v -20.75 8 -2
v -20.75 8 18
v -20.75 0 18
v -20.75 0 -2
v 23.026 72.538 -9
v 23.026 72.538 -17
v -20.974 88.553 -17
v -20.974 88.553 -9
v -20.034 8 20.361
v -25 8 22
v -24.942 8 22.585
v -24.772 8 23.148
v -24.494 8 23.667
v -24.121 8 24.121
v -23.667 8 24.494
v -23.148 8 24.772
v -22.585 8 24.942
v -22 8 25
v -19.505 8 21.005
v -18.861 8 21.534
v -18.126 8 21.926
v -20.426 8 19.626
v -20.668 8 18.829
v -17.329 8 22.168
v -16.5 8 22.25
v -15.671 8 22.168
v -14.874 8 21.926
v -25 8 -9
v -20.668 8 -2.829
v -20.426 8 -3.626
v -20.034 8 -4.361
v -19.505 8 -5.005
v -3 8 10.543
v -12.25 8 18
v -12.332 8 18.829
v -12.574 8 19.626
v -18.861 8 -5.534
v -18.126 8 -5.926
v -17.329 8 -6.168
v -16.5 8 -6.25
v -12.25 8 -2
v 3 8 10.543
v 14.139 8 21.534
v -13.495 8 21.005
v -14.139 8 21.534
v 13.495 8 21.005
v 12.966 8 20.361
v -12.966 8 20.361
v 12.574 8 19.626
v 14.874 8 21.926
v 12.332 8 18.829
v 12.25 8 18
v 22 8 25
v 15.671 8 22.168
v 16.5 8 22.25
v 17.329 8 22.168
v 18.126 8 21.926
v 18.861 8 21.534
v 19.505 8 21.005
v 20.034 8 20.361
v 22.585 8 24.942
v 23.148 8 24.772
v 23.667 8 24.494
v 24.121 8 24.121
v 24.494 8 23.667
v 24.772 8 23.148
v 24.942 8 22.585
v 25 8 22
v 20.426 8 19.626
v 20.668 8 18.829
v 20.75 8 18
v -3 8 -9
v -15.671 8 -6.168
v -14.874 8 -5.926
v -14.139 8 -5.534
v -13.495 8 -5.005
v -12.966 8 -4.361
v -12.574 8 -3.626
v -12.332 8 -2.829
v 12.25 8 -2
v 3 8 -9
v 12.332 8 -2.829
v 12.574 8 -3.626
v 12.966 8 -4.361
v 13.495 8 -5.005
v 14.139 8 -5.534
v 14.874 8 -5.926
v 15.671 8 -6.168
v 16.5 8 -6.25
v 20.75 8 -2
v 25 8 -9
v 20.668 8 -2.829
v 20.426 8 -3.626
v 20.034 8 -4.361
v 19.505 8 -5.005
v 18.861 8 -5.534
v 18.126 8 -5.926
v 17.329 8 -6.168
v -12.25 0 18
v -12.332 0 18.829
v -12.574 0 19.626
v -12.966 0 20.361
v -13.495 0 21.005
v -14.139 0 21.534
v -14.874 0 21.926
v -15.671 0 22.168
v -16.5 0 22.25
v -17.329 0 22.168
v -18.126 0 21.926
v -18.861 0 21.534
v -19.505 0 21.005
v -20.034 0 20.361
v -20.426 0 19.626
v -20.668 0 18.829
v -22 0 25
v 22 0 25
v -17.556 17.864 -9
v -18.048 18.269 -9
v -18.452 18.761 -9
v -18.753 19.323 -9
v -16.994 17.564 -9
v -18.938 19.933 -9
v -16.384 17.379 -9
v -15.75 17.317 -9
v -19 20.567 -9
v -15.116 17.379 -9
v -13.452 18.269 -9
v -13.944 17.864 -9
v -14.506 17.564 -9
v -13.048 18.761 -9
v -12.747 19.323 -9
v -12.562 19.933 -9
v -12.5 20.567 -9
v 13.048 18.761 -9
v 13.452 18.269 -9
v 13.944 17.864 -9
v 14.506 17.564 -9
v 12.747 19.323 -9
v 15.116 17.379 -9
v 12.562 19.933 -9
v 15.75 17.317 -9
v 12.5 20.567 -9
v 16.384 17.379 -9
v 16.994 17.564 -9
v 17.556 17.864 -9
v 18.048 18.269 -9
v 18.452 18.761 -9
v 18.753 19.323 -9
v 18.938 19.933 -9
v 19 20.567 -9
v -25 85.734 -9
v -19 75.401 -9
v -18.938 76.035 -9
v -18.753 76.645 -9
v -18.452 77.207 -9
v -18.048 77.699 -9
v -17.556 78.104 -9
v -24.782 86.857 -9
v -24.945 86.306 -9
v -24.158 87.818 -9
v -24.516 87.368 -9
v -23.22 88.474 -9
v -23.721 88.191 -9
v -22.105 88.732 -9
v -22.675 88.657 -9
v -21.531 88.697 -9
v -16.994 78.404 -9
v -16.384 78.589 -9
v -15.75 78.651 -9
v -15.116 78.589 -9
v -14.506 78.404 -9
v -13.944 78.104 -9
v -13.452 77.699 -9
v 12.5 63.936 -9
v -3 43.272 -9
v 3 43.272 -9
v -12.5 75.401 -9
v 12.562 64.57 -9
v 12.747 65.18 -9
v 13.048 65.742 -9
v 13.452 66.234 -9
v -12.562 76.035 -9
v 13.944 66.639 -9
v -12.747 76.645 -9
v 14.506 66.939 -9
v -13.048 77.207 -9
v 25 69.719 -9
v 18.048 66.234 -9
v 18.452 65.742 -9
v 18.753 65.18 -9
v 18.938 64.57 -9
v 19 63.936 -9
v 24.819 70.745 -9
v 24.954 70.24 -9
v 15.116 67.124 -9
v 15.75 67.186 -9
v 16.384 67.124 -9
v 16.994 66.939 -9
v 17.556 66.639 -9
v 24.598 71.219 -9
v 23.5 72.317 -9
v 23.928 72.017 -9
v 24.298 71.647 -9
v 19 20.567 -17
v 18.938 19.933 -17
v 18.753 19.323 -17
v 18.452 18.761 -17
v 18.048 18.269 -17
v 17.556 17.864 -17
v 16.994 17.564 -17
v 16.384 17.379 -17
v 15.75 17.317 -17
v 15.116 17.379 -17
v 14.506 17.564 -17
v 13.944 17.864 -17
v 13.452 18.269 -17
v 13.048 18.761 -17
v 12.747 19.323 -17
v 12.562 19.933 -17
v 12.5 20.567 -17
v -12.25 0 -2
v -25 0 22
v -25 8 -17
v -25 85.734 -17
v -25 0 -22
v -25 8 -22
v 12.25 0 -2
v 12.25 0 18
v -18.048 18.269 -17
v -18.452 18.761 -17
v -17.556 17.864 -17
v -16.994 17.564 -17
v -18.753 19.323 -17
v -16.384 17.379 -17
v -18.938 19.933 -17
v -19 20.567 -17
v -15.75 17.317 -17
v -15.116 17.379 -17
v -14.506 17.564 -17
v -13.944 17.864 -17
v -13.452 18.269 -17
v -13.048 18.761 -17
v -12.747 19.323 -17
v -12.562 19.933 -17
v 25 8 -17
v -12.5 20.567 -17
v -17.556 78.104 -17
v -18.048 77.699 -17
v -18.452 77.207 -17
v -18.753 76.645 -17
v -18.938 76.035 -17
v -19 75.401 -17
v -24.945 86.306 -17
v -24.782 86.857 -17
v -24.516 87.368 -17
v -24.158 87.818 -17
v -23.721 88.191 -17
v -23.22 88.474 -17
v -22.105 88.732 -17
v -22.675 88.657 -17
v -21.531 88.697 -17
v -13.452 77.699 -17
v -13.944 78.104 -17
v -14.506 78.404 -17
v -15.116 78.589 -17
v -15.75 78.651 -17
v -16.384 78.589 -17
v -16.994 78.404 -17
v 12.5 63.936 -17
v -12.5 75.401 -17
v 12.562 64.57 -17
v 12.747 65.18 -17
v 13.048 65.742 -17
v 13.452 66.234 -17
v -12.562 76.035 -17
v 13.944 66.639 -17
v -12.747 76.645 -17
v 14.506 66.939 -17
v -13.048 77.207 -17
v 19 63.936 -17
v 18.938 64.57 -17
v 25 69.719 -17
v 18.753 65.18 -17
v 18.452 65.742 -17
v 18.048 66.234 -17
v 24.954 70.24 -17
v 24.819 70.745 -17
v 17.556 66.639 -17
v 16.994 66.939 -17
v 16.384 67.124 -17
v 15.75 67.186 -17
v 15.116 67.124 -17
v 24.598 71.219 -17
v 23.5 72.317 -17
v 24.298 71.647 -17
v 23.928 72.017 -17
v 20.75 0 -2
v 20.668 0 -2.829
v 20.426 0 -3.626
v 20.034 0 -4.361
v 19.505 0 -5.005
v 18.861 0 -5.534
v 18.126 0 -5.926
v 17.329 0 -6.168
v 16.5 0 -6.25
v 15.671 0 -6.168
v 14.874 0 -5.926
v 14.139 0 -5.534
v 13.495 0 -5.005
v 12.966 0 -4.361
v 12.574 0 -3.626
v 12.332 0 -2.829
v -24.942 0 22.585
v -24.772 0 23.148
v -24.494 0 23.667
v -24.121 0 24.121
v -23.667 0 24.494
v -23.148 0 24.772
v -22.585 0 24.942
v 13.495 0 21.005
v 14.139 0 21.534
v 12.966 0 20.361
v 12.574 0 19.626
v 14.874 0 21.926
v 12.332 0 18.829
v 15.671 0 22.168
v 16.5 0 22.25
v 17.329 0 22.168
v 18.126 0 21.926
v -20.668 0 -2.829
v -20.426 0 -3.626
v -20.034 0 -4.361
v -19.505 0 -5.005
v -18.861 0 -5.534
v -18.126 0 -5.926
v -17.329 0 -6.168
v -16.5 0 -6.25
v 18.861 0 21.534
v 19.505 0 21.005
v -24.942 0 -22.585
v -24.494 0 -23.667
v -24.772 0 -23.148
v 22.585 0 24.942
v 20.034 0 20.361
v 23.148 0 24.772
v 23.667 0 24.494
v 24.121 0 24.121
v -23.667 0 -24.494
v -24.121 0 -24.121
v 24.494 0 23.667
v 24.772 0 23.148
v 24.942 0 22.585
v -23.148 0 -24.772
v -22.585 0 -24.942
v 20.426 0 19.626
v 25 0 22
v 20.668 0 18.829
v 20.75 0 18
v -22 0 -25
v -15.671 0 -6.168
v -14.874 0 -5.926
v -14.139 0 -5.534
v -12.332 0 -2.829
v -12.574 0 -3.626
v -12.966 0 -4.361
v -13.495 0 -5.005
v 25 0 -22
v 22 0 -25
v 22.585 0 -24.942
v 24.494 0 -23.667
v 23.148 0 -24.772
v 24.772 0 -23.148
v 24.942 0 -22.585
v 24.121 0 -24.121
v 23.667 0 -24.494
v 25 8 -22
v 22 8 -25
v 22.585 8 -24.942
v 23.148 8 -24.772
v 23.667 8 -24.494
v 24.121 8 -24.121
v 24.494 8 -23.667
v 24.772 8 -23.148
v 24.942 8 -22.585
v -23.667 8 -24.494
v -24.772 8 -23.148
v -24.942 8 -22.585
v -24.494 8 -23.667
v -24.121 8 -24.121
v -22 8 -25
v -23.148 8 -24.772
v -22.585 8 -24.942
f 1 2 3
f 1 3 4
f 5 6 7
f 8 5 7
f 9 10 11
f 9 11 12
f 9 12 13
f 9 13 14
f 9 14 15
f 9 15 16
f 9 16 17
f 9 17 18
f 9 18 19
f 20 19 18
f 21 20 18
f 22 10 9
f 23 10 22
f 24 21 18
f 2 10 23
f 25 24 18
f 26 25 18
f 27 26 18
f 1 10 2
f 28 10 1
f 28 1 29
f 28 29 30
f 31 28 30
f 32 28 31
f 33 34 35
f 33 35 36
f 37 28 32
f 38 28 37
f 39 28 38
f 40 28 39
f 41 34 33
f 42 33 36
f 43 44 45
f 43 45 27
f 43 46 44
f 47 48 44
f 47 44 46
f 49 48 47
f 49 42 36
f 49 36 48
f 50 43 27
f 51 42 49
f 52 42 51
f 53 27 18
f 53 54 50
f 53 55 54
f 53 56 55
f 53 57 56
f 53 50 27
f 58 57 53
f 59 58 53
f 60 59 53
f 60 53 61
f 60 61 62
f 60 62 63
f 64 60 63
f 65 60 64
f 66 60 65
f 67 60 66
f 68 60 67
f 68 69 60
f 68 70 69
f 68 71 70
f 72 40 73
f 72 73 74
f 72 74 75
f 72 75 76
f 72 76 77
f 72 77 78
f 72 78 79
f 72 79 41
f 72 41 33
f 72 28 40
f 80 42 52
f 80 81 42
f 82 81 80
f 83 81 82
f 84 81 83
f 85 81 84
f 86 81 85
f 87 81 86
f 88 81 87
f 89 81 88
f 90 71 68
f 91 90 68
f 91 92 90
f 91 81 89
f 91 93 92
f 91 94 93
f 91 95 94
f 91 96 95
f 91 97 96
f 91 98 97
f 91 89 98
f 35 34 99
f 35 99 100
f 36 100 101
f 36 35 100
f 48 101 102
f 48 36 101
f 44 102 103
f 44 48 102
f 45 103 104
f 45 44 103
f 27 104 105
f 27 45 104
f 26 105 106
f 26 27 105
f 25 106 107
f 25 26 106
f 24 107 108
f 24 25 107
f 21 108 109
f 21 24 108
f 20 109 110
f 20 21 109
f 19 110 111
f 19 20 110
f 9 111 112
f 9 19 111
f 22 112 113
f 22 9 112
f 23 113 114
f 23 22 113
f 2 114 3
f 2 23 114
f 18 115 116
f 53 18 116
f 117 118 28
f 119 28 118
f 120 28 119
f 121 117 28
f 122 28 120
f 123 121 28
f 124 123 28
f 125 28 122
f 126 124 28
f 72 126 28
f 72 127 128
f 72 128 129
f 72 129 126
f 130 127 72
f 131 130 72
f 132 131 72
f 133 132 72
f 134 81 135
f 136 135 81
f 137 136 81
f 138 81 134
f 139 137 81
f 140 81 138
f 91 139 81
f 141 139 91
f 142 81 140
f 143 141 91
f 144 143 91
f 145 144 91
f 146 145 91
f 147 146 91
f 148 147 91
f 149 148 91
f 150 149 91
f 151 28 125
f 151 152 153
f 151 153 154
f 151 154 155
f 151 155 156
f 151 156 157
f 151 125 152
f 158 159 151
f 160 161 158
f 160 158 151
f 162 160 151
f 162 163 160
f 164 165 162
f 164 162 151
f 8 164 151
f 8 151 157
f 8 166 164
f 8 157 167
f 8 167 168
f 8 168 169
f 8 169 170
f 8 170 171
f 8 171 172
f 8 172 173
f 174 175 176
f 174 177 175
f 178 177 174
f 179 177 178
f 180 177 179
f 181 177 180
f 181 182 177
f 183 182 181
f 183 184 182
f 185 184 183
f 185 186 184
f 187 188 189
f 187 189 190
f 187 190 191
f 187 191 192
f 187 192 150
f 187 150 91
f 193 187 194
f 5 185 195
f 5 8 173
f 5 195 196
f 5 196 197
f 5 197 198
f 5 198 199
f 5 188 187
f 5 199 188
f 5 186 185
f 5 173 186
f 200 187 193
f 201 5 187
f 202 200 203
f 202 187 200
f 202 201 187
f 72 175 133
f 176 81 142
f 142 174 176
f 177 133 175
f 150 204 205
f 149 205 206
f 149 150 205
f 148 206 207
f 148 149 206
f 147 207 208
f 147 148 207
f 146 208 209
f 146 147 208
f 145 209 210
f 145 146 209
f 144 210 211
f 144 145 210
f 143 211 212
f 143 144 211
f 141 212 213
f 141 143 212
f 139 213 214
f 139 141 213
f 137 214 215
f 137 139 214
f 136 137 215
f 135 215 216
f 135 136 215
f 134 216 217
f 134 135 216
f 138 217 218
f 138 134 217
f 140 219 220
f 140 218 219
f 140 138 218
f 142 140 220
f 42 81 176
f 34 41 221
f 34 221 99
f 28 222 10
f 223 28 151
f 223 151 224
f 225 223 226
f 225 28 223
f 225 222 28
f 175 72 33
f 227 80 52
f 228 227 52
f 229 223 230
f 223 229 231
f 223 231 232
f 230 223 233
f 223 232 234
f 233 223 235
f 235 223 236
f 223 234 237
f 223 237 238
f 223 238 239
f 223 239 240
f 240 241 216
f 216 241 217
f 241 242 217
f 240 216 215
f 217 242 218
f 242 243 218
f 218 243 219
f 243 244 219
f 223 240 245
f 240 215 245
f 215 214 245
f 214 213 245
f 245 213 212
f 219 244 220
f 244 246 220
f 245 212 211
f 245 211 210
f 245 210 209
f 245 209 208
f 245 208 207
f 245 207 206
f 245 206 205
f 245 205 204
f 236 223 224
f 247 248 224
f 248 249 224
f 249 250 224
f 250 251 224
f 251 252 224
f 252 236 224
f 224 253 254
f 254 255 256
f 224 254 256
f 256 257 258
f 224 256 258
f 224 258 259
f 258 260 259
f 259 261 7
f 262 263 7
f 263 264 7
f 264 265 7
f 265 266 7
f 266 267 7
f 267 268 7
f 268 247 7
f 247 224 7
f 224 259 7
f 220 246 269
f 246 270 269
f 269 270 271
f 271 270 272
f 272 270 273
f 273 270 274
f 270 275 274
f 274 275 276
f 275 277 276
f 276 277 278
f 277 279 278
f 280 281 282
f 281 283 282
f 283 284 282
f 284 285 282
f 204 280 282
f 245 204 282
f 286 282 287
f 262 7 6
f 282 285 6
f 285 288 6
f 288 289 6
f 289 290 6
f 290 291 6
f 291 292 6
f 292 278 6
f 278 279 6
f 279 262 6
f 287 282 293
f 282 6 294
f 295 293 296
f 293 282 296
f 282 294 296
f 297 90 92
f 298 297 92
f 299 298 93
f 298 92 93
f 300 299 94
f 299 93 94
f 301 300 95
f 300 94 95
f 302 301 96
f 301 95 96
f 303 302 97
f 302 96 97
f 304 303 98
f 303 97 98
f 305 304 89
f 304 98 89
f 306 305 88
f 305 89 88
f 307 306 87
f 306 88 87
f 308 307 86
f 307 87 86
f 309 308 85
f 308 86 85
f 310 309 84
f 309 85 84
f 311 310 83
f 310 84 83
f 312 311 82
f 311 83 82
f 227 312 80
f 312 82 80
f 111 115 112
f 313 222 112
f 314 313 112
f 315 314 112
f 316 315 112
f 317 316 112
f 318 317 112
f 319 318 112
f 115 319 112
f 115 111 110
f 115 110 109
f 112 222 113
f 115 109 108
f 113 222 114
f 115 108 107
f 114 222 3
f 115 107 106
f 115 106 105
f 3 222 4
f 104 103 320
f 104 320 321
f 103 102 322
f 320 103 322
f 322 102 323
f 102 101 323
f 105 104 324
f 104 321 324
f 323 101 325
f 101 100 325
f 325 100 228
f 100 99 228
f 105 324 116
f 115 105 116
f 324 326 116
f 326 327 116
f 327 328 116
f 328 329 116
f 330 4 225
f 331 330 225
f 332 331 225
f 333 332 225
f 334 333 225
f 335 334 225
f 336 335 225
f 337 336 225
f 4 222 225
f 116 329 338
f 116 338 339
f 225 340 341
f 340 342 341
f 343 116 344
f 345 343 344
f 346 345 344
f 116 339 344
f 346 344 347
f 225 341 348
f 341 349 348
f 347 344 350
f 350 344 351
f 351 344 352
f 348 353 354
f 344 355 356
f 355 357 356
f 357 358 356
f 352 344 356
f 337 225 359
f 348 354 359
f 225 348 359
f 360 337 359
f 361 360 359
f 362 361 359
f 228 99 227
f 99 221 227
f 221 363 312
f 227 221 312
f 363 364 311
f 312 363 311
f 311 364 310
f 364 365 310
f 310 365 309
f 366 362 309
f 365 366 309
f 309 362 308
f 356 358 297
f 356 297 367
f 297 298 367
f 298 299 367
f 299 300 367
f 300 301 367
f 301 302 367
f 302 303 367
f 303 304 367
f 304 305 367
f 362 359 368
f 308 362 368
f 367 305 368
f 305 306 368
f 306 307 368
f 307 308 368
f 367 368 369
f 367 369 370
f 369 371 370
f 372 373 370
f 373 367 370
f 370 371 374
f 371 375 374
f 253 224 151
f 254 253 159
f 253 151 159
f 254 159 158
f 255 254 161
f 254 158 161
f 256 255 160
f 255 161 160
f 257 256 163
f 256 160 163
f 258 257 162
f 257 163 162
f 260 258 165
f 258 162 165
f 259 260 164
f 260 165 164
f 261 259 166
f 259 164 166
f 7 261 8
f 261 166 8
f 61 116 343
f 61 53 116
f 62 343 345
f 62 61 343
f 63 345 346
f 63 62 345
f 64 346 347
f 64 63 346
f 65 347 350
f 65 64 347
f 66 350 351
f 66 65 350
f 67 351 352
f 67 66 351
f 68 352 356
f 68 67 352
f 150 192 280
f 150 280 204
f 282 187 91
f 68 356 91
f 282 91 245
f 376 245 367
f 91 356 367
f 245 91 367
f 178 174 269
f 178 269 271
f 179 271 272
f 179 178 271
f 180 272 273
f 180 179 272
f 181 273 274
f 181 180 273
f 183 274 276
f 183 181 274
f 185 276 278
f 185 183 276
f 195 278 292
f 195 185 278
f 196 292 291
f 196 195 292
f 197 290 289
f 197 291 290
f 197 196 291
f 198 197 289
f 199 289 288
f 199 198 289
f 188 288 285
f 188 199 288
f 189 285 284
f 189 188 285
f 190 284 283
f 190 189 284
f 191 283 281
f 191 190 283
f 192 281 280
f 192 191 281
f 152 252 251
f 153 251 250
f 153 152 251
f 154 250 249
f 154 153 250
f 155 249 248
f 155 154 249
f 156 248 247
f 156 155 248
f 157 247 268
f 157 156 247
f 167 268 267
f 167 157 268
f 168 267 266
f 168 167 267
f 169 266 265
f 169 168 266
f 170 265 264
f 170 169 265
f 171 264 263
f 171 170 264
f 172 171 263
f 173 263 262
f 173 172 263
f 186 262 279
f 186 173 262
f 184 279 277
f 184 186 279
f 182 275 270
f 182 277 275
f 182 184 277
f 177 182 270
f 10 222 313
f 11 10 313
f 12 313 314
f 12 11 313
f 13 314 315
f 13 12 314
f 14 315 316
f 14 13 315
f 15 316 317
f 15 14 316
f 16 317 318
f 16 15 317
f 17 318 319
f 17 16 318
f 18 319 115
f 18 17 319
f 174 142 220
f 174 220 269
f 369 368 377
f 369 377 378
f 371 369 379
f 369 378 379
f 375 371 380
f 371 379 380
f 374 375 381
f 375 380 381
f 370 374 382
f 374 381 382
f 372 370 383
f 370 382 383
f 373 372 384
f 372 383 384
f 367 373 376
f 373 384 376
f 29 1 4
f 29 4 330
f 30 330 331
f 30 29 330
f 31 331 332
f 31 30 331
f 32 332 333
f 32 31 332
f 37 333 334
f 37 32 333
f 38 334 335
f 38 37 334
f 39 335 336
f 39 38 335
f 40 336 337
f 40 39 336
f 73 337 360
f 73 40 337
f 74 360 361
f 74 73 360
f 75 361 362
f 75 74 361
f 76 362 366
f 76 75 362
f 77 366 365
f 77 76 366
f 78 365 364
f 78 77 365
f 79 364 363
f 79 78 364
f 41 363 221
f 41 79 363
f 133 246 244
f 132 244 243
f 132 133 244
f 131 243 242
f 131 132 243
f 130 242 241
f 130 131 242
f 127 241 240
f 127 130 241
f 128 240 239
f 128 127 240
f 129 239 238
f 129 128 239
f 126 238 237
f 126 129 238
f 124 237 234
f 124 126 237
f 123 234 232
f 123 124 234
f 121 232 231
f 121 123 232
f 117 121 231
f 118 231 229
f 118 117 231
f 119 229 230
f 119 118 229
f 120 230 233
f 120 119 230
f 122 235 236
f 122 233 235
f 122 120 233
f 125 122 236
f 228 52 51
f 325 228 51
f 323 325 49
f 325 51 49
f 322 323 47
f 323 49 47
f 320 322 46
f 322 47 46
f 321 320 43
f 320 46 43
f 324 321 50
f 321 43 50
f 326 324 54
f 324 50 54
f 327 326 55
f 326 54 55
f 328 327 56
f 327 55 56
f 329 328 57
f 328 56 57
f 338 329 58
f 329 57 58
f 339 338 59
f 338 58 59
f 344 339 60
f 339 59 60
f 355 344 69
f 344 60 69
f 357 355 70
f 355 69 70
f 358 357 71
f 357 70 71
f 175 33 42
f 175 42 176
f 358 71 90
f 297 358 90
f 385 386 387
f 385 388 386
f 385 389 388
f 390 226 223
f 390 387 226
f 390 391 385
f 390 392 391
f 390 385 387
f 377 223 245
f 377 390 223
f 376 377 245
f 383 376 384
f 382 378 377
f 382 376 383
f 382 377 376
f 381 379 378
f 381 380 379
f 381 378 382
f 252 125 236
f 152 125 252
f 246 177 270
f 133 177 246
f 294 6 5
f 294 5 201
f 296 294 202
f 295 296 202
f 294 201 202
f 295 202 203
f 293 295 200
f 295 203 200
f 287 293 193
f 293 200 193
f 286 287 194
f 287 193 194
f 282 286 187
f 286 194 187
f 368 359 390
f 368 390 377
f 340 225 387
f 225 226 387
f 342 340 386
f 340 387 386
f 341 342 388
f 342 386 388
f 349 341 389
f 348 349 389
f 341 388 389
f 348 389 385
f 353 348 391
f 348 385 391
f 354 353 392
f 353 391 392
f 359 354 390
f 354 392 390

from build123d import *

# Parameters (mm, degrees)
SKETCH2_W           = 50
SKETCH2_H           = 50
BOSS_EXTRUDE1_DEPTH = 8
BOSS_EXTRUDE2_START = -8
BOSS_EXTRUDE2_DEPTH = 8
CUT_EXTRUDE2_DEPTH  = 8
BOSS_EXTRUDE3_START = -28
BOSS_EXTRUDE3_DEPTH = 6
CUT_EXTRUDE3_DEPTH  = 100.419585885
FILLET1_R           = 3


with BuildPart() as part:
    # Sketch2 → Boss-Extrude1 (new body)
    with BuildSketch(Plane(origin=(0, 0, 0), x_dir=(1, 0, 0), z_dir=(0, 1, 0))):
        Rectangle(SKETCH2_W, SKETCH2_H)
    extrude(amount=BOSS_EXTRUDE1_DEPTH)

    # Sketch5 → Boss-Extrude2 (add)
    with BuildSketch(Plane(origin=(0, 0, -25), x_dir=(-1, 0, 0), z_dir=(0, 0, -1)).offset(BOSS_EXTRUDE2_START)):
        Polygon((-25, 0), (-25, 71.819564568), (25, 90.018076282), (25, 0), align=None)
    extrude(amount=-BOSS_EXTRUDE2_DEPTH)

    # Sketch6 → Cut-Extrude2 (cut)
    with BuildSketch(Plane(origin=(0, 8, 0), x_dir=(1, 0, 0), z_dir=(0, 1, 0))):
        with BuildLine():
            Line((-12.25, 2), (-12.25, -18))
            ThreePointArc((-12.25, -18), (-16.5, -22.25), (-20.75, -18))
            Line((-20.75, -18), (-20.75, 2))
            ThreePointArc((-20.75, 2), (-16.5, 6.25), (-12.25, 2))
        make_face()
        with BuildLine():
            Line((12.25, 2), (12.25, -18))
            ThreePointArc((12.25, -18), (16.5, -22.25), (20.75, -18))
            Line((20.75, -18), (20.75, 2))
            ThreePointArc((20.75, 2), (16.5, 6.25), (12.25, 2))
        make_face()
    extrude(amount=-CUT_EXTRUDE2_DEPTH, mode=Mode.SUBTRACT)

    # Sketch7 → Boss-Extrude3 (add)
    with BuildSketch(Plane(origin=(25, 0, 0), x_dir=(0, 0, -1), z_dir=(1, 0, 0)).offset(BOSS_EXTRUDE3_START)):
        Polygon((9, 8), (-10.543361274, 8), (9, 43.271779749), align=None)
    extrude(amount=BOSS_EXTRUDE3_DEPTH)

    # Sketch8 → Cut-Extrude3 (cut, through all)
    with BuildSketch(Plane.XY.offset(-9)):
        with BuildLine():
            Line((-12.5, 75.401351615), (-12.5, 20.566768933))
            ThreePointArc((-12.5, 20.566768933), (-15.75, 17.316768933), (-19, 20.566768933))
            Line((-19, 20.566768933), (-19, 75.401351615))
            ThreePointArc((-19, 75.401351615), (-15.75, 78.651351615), (-12.5, 75.401351615))
        make_face()
        with BuildLine():
            Line((19, 63.936289235), (19, 20.566768933))
            ThreePointArc((19, 20.566768933), (15.75, 17.316768933), (12.5, 20.566768933))
            Line((12.5, 20.566768933), (12.5, 63.936289235))
            ThreePointArc((12.5, 63.936289235), (15.75, 67.186289235), (19, 63.936289235))
        make_face()
    extrude(amount=-CUT_EXTRUDE3_DEPTH, mode=Mode.SUBTRACT)

    # Fillet1
    fillet1_edges = [part.edges().sort_by_distance(p)[0] for p in [
        (-25, 90.018076282, -13),
        (25, 71.819564568, -13),
        (-25, 4, -25),
        (25, 4, -25),
        (25, 4, 25),
        (-25, 4, 25),
    ]]
    fillet(fillet1_edges, radius=FILLET1_R)


solid = part.part
